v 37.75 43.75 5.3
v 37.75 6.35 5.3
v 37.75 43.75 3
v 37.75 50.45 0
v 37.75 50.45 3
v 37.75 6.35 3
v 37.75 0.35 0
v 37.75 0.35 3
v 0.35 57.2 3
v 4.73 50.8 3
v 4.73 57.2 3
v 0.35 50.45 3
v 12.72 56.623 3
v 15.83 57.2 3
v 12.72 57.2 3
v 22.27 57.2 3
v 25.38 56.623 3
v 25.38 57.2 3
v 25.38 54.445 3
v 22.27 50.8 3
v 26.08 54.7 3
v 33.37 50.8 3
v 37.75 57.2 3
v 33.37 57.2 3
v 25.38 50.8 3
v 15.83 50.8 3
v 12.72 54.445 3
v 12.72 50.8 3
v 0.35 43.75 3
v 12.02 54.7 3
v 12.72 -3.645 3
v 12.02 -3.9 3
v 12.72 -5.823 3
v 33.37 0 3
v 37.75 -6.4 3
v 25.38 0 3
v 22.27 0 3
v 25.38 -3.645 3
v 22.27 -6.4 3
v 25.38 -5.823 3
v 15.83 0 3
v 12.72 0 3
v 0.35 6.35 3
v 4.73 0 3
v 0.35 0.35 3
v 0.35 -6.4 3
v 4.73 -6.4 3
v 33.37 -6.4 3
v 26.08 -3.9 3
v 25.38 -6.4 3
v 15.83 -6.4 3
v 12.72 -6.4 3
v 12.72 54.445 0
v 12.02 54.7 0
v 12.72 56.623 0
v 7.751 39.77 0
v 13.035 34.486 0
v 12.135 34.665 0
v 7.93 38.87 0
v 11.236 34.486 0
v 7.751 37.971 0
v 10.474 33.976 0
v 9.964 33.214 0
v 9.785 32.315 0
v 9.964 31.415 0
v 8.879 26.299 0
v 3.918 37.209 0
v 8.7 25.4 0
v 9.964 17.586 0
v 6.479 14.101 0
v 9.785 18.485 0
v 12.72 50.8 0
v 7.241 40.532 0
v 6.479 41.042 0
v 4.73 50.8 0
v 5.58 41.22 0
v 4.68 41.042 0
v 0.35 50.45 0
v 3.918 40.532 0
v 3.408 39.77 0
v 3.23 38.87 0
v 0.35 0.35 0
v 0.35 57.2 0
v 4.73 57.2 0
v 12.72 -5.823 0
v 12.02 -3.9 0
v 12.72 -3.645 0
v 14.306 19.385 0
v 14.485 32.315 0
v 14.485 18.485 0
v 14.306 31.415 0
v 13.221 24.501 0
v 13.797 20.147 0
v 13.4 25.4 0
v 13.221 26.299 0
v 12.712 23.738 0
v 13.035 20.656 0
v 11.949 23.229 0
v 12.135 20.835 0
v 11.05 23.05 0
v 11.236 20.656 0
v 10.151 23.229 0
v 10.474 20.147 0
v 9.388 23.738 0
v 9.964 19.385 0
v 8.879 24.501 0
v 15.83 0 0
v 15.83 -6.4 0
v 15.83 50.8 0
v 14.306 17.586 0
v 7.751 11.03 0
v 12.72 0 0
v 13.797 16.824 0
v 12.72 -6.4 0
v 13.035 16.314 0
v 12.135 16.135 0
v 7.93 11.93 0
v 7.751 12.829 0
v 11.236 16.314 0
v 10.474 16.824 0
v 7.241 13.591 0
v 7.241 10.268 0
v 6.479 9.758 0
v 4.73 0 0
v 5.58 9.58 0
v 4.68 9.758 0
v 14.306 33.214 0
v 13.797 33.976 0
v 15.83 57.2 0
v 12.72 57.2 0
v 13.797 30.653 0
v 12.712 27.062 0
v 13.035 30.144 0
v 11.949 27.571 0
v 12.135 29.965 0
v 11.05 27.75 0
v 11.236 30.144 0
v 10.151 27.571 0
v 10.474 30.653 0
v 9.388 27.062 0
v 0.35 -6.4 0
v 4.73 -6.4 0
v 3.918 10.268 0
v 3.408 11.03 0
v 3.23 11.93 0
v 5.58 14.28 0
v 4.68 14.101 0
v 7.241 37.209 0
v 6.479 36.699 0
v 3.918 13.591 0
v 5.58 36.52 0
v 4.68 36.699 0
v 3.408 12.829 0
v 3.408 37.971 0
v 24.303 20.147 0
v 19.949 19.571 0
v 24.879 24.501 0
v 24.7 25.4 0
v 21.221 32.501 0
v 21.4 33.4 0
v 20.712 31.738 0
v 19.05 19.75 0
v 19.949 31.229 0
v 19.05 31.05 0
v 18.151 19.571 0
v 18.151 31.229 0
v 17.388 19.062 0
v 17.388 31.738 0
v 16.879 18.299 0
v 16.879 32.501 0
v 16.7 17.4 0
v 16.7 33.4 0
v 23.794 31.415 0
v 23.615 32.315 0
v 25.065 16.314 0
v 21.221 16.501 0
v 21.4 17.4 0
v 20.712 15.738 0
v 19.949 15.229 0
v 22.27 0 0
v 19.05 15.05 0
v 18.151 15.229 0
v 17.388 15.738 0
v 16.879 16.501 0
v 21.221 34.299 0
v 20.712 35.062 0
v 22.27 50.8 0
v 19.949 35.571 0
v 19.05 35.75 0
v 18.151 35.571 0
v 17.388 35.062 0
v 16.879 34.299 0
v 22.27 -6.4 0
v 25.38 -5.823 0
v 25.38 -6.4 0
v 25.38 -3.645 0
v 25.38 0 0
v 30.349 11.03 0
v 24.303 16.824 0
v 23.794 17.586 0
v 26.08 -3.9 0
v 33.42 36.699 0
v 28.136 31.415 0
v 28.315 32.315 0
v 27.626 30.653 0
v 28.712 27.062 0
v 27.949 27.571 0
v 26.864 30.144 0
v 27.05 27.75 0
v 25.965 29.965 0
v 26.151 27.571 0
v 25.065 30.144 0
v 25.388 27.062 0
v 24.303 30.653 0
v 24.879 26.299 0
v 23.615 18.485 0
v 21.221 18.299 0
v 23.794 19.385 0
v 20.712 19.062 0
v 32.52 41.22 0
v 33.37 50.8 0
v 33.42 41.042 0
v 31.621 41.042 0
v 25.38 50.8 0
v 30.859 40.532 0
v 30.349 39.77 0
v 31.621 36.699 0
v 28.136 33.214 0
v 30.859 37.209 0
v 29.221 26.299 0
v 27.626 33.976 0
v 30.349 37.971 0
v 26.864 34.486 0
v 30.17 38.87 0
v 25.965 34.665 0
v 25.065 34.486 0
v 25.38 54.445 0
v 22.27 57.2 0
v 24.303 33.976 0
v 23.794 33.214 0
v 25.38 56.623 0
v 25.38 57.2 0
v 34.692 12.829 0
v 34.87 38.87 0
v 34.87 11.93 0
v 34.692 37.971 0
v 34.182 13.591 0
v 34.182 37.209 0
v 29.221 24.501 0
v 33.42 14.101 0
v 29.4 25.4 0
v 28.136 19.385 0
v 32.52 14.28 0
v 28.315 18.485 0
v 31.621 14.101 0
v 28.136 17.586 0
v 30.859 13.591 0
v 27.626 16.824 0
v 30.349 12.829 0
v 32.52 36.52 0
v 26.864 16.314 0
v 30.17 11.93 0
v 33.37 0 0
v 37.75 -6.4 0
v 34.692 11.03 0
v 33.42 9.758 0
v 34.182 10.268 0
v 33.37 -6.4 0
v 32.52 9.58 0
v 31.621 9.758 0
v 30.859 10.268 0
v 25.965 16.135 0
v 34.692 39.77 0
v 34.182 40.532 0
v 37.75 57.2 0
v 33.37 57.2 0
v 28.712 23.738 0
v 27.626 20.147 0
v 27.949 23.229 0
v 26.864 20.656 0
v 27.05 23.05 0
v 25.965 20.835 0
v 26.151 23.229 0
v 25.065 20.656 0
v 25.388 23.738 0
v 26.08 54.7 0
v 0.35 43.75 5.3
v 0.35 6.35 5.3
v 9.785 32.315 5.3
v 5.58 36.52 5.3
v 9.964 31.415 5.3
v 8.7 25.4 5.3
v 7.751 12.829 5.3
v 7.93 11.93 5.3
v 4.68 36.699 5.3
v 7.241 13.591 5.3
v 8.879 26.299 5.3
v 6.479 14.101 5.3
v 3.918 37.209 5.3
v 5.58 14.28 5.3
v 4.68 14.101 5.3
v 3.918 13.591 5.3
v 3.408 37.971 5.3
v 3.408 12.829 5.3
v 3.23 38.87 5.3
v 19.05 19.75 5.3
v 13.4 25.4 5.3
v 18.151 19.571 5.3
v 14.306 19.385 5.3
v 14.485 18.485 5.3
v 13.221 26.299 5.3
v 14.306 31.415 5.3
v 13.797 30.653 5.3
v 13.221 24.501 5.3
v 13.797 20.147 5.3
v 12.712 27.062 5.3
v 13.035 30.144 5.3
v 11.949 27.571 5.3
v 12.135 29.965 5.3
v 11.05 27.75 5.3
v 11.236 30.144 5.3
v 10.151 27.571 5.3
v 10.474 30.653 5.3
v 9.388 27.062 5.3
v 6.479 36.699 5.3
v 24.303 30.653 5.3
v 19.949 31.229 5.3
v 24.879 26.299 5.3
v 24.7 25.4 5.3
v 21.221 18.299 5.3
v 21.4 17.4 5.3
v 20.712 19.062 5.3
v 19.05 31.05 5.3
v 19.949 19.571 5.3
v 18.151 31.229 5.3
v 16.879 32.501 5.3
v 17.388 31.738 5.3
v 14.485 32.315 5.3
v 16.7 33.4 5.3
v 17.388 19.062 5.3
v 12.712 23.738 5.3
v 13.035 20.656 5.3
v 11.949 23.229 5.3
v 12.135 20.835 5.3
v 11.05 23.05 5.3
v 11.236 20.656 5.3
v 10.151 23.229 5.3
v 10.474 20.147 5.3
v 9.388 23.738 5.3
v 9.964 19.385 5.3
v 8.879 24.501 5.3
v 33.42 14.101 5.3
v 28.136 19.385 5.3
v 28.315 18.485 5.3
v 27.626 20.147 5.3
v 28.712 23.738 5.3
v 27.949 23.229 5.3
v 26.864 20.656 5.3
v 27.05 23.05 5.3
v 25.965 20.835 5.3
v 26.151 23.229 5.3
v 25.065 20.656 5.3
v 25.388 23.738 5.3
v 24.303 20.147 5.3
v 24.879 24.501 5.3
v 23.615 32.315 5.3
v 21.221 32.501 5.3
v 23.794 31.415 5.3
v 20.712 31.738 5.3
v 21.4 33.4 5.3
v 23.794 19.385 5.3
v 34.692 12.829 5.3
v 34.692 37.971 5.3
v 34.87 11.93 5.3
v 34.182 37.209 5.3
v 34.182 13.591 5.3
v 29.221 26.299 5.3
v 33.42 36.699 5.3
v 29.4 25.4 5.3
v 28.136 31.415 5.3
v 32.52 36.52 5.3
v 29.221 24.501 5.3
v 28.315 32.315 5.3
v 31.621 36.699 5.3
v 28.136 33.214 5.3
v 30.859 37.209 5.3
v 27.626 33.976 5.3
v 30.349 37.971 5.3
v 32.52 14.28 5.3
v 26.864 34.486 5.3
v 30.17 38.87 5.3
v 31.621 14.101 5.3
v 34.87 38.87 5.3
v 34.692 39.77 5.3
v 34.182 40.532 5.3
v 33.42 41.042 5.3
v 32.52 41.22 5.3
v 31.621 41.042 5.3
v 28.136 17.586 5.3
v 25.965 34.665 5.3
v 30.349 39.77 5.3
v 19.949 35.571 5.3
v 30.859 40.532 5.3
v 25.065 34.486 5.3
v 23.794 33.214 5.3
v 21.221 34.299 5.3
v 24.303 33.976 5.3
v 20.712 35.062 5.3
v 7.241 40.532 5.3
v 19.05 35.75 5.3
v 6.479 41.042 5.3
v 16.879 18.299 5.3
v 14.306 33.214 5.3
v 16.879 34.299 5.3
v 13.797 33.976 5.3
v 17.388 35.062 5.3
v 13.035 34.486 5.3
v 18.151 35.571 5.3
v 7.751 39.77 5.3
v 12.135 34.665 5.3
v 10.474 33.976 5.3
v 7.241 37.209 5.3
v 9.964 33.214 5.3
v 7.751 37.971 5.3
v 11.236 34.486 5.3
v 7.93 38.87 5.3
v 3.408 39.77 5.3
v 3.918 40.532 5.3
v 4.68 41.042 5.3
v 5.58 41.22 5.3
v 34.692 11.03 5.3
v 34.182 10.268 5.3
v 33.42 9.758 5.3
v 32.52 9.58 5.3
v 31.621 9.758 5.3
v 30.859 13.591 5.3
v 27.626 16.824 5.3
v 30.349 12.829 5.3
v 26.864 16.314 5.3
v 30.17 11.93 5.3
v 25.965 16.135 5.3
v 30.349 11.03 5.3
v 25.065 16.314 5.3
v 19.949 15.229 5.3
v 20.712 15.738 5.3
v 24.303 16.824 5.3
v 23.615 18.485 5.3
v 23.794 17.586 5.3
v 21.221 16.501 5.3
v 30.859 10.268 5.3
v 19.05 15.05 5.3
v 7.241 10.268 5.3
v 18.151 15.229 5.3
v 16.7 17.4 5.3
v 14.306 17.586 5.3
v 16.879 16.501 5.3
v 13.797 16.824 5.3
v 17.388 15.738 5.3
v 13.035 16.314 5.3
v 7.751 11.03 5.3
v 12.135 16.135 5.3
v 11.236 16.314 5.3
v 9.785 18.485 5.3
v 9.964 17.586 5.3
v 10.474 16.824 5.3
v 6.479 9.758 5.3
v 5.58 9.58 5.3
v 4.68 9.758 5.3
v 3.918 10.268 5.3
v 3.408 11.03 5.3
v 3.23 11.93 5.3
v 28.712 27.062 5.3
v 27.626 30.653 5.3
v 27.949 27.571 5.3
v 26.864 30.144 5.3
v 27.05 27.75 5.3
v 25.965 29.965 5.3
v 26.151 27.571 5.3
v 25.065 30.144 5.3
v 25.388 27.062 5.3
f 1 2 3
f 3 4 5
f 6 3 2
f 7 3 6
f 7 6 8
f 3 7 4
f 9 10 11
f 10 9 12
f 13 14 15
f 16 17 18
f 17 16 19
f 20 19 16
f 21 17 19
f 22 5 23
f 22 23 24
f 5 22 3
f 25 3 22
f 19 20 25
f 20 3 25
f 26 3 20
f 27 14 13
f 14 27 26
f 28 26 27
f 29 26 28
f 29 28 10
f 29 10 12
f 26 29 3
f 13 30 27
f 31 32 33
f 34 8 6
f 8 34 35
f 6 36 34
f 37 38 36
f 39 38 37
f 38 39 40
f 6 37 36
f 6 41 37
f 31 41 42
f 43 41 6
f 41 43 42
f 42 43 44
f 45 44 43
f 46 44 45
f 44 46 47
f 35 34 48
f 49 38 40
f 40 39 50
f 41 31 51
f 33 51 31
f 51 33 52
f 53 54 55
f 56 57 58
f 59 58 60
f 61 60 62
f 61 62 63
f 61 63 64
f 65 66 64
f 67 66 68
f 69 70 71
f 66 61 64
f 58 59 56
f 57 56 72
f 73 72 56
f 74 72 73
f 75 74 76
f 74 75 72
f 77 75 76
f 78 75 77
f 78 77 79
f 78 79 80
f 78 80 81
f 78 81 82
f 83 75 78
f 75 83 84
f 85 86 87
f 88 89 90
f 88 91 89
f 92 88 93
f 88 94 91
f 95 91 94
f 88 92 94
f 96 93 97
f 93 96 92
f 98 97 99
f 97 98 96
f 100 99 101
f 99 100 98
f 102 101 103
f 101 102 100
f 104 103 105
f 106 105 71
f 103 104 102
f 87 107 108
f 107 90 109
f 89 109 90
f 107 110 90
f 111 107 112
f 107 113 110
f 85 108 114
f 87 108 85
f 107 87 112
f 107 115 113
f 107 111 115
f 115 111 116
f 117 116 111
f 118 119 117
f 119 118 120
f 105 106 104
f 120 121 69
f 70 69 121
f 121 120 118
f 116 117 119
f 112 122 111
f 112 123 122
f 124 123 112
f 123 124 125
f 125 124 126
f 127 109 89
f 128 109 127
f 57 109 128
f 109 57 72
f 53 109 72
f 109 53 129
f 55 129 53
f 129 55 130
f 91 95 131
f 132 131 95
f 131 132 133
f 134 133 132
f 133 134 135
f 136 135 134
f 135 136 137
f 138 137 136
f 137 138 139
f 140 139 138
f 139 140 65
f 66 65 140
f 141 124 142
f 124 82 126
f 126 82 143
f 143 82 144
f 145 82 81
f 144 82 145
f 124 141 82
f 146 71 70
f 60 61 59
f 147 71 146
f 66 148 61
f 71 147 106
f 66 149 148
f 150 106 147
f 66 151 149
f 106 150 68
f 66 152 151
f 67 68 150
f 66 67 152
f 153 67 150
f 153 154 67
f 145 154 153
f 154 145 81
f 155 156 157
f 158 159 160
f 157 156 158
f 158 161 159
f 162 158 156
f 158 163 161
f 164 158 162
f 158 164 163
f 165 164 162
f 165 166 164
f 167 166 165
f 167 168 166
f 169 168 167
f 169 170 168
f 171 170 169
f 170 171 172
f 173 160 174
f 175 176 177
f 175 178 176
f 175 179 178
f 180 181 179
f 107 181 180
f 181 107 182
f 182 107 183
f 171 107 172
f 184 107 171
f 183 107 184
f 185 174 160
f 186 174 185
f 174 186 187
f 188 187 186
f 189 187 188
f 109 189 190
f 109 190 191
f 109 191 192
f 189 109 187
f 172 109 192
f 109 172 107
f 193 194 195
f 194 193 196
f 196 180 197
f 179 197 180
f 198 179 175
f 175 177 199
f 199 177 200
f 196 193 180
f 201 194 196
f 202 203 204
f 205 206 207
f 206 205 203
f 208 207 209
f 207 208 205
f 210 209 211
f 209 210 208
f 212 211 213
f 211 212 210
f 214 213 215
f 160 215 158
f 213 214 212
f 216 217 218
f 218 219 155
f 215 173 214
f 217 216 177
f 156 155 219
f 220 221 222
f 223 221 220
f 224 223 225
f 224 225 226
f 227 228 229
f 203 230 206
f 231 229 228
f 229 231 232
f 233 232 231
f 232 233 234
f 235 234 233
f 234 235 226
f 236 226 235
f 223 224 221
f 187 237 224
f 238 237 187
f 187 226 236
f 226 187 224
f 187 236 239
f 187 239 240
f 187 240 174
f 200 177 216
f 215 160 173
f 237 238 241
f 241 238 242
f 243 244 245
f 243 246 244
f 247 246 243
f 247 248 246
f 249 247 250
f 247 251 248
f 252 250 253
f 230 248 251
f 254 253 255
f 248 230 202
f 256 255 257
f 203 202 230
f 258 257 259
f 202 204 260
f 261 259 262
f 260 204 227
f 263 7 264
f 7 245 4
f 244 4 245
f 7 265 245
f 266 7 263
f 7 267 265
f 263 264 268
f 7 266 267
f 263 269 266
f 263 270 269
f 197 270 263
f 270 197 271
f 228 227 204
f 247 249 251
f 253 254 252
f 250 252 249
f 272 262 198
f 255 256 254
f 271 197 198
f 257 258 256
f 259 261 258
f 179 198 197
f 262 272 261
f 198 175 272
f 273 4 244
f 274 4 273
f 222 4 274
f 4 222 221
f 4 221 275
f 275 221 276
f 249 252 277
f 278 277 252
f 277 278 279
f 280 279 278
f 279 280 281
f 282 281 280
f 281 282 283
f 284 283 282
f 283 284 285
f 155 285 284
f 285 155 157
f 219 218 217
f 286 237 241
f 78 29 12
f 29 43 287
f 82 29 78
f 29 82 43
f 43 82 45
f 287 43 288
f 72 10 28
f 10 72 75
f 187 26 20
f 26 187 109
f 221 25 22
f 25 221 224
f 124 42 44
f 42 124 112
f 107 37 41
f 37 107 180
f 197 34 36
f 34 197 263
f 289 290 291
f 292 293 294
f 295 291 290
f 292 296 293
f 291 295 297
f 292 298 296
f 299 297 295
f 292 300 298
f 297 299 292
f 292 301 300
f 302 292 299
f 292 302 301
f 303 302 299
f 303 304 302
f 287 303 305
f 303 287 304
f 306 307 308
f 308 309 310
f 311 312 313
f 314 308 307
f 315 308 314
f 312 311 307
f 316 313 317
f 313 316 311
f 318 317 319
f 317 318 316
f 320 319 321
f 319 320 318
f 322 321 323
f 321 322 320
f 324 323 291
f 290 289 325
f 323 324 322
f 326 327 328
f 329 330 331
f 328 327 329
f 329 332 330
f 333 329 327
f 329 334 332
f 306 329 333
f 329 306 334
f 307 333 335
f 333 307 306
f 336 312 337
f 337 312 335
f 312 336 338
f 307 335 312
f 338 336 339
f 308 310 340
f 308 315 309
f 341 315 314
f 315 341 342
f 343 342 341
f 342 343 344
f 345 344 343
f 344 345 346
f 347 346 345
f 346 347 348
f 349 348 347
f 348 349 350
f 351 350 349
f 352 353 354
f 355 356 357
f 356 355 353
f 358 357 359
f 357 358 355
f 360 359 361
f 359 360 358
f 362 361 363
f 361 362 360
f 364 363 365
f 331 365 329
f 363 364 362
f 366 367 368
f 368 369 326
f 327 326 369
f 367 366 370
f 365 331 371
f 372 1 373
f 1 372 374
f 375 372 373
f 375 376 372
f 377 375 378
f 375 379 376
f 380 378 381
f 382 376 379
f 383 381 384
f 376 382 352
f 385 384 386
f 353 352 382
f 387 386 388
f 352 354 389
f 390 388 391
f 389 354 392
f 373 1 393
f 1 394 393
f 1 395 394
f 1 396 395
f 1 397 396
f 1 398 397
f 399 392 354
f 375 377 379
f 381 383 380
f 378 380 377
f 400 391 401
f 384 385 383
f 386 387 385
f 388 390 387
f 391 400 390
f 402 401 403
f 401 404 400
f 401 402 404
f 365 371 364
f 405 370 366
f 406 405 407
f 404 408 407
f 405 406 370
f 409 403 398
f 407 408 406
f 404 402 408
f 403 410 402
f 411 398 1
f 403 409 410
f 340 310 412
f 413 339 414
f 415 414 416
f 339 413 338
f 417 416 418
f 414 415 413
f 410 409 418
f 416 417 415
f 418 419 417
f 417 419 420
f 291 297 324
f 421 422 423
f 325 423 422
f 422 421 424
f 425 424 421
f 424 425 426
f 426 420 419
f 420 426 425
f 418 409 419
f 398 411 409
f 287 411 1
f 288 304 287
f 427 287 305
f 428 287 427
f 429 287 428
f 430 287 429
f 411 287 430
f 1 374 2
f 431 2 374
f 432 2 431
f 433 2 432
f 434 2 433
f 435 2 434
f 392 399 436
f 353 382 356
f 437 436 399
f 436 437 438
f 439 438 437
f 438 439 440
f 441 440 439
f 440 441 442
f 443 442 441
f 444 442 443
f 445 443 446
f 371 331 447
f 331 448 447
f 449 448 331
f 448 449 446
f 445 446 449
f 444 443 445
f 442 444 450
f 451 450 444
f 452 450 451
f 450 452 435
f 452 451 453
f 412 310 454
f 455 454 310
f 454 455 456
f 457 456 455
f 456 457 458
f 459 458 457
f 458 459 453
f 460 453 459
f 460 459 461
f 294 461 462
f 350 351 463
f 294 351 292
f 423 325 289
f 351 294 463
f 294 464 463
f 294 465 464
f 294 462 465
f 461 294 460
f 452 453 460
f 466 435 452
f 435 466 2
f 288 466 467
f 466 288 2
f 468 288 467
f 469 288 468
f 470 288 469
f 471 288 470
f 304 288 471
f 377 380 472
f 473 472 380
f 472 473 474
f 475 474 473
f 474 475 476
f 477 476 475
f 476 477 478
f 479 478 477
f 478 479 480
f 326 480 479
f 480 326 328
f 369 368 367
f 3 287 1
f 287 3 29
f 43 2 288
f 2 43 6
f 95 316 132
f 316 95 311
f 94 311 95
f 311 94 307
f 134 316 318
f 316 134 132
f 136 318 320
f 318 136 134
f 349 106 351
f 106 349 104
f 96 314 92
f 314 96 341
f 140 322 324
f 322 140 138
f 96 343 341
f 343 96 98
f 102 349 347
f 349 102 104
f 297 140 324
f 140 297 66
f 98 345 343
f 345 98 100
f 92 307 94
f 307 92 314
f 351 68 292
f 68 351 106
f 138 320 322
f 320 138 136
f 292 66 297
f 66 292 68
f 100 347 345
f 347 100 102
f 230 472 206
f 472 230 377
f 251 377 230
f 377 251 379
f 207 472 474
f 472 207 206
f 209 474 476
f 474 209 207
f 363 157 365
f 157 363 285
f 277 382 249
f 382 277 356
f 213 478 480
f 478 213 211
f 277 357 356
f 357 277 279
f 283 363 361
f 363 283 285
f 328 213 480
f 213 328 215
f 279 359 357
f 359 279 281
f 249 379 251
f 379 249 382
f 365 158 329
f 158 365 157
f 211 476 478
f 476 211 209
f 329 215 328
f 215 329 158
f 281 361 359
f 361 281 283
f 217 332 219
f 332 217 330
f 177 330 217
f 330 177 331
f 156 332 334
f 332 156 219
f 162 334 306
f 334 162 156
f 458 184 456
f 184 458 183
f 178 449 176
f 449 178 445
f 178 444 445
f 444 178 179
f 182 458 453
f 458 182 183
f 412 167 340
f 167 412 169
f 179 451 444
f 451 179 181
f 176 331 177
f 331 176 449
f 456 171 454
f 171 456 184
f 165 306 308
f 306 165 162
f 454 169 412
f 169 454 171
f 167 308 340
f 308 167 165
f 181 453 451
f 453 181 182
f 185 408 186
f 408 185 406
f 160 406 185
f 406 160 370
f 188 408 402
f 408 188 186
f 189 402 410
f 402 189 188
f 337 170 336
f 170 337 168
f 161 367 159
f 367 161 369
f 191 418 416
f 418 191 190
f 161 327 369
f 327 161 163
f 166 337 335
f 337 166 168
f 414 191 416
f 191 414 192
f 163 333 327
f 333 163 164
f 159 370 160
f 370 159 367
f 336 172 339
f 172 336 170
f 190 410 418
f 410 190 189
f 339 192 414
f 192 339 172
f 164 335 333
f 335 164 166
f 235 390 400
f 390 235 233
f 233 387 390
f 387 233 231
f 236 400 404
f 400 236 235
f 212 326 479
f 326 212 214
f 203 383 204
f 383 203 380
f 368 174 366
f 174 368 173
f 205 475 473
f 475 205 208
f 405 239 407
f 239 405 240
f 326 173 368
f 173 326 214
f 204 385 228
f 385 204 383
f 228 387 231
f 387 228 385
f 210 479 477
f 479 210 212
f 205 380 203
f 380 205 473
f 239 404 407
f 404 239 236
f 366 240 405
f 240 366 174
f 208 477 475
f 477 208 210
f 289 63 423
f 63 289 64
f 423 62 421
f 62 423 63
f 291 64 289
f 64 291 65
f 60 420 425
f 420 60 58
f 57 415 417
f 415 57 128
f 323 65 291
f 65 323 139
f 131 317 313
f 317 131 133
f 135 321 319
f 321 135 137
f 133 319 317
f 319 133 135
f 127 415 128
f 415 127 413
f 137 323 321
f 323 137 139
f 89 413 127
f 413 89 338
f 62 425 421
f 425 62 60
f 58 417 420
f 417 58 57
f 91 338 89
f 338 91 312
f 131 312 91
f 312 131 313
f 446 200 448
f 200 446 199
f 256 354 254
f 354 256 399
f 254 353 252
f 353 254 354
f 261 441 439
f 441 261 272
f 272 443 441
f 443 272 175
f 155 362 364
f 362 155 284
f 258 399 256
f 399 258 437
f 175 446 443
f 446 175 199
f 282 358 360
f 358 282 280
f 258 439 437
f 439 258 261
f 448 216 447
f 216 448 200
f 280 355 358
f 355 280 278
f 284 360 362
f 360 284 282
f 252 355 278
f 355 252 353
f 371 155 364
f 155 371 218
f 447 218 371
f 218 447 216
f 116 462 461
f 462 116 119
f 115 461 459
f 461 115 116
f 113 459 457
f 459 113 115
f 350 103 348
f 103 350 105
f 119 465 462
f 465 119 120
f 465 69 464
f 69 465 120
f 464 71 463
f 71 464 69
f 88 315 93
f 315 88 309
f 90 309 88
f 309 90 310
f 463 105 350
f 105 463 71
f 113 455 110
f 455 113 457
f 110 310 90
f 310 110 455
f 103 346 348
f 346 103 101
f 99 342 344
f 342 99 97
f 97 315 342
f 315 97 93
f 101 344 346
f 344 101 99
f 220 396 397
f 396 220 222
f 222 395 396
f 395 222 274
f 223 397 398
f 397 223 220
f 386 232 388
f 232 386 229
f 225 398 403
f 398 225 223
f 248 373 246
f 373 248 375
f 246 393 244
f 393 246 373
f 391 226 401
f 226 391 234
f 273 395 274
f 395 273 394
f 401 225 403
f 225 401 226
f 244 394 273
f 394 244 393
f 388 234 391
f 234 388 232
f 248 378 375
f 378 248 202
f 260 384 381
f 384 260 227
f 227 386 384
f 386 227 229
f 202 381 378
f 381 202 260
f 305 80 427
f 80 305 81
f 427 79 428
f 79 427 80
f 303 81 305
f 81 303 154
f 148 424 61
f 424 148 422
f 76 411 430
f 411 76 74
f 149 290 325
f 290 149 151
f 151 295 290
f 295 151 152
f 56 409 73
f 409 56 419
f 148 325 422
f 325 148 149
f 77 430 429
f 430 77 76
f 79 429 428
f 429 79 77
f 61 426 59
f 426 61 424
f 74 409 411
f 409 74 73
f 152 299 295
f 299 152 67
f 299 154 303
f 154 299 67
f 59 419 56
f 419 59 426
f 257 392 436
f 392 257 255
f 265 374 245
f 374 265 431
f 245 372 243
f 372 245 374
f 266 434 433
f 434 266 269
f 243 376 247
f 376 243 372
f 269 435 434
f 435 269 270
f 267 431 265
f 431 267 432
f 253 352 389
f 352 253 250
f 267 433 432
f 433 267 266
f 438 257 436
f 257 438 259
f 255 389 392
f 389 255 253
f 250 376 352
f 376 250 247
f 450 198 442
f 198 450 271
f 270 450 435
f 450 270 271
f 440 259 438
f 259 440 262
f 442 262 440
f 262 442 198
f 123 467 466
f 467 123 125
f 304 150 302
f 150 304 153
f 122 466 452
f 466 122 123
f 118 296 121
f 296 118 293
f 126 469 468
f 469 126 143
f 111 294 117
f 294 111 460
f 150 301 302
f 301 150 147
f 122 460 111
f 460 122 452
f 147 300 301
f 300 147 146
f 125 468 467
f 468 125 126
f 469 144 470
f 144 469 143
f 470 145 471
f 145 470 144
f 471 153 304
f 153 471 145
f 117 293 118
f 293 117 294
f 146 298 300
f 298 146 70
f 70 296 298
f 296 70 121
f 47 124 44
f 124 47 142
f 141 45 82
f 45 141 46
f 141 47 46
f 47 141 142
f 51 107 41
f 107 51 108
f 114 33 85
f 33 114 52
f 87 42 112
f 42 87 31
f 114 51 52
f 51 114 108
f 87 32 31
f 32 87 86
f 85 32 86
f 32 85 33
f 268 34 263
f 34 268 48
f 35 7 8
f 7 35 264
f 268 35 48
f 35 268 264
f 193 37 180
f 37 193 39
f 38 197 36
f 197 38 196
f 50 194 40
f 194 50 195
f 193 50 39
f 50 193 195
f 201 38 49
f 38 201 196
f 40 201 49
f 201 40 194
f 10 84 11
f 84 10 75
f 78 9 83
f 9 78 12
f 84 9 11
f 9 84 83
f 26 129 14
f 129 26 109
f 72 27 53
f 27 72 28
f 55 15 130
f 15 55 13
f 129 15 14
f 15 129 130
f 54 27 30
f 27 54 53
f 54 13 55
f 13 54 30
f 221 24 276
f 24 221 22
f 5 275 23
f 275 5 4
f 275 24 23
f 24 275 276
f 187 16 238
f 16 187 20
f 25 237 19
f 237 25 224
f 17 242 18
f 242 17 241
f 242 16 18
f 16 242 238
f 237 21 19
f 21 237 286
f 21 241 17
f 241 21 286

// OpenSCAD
// in inches, distance between clips
base_length=2.0; //[1.5:0.25:4.5]

// in mm, extra spacing for slots/tabs
xy_tolerance=0.35; //[0.1:0.05:1.0]

// preview[view:south, tilt:top]

/* [Hidden] */
i2m=25.4; // inches to mm
rHole=2.35; //mm


// central block for mount, with holes
difference() {
    
translate([xy_tolerance,0,0]){
cube([1.5*i2m - 2*xy_tolerance, base_length*i2m, 3]);
    translate([0,(base_length/2-0.75)*i2m,0])
cube([1.5*i2m - 2*xy_tolerance, 1.5*i2m - 2*xy_tolerance, 5.3]);
}
    
    // tetrix holes
    translate([0.75*i2m - 8, base_length*i2m/2, -2])
    cylinder(h=10, r=rHole, $fn=16);
    translate([0.75*i2m + 8, base_length*i2m/2, -2])
    cylinder(h=10, r=rHole, $fn=16);
    translate([0.75*i2m , base_length*i2m/2 -8, -2])
    cylinder(h=10, r=rHole, $fn=16);
    translate([0.75*i2m, base_length*i2m/2 +8, -2])
    cylinder(h=10, r=rHole, $fn=16);
    
    // actobotics inner holes
    translate([0.75*i2m, base_length*i2m/2, -2])
    rotate(45)
    translate([0.77/2*i2m, 0, -2])
    cylinder(h=10, r=rHole, $fn=16);
    
    translate([0.75*i2m, base_length*i2m/2, -2])
    rotate(135)
    translate([0.77/2*i2m, 0, -2])
    cylinder(h=10, r=rHole, $fn=16);
    
    translate([0.75*i2m, base_length*i2m/2, -2])
    rotate(-45)
    translate([0.77/2*i2m, 0, -2])
    cylinder(h=10, r=rHole, $fn=16);
    
    translate([0.75*i2m, base_length*i2m/2, -2])
    rotate(-135)
    translate([0.77/2*i2m, 0, -2])
    cylinder(h=10, r=rHole, $fn=16);
    
    // actobotics outer holes
    translate([0.75*i2m, base_length*i2m/2, -2])
    rotate(45)
    translate([0.75*i2m, 0, -2])
    cylinder(h=10, r=rHole, $fn=16);
    
    translate([0.75*i2m, base_length*i2m/2, -2])
    rotate(135)
    translate([0.75*i2m, 0, -2])
    cylinder(h=10, r=rHole, $fn=16);
    
    translate([0.75*i2m, base_length*i2m/2, -2])
    rotate(-45)
    translate([0.75*i2m, 0, -2])
    cylinder(h=10, r=rHole, $fn=16);
    
    translate([0.75*i2m, base_length*i2m/2, -2])
    rotate(-135)
    translate([0.75*i2m, 0, -2])
    cylinder(h=10, r=rHole, $fn=16);
}

tabs();

translate([0,base_length*i2m,0])
rotate(180)
mirror([1,0,0])
tabs();


    
 module tabs() {
     
    halfTabs();
    
    translate([1.5*i2m,0,0])
    mirror([1,0,0]) 
    halfTabs();
}

module halfTabs() {

    translate([0,-2*3.2,0])
    translate([xy_tolerance,0,0])
    cube([.2*i2m -2*xy_tolerance,2*3.2+xy_tolerance, 3]);
    
    translate([0.75*i2m-13.36/2,-2*3.2,0])
    translate([xy_tolerance,0,0])
    cube([.15*i2m -2*xy_tolerance,2*3.2+xy_tolerance, 3]);
    
    translate([0.75*i2m-13.36/2-0.7,-3.2-0.7,0])
    translate([xy_tolerance,0,0])
    rotate(-70)
    cube([.13*i2m -2*xy_tolerance,1.2+xy_tolerance, 3]);
}
